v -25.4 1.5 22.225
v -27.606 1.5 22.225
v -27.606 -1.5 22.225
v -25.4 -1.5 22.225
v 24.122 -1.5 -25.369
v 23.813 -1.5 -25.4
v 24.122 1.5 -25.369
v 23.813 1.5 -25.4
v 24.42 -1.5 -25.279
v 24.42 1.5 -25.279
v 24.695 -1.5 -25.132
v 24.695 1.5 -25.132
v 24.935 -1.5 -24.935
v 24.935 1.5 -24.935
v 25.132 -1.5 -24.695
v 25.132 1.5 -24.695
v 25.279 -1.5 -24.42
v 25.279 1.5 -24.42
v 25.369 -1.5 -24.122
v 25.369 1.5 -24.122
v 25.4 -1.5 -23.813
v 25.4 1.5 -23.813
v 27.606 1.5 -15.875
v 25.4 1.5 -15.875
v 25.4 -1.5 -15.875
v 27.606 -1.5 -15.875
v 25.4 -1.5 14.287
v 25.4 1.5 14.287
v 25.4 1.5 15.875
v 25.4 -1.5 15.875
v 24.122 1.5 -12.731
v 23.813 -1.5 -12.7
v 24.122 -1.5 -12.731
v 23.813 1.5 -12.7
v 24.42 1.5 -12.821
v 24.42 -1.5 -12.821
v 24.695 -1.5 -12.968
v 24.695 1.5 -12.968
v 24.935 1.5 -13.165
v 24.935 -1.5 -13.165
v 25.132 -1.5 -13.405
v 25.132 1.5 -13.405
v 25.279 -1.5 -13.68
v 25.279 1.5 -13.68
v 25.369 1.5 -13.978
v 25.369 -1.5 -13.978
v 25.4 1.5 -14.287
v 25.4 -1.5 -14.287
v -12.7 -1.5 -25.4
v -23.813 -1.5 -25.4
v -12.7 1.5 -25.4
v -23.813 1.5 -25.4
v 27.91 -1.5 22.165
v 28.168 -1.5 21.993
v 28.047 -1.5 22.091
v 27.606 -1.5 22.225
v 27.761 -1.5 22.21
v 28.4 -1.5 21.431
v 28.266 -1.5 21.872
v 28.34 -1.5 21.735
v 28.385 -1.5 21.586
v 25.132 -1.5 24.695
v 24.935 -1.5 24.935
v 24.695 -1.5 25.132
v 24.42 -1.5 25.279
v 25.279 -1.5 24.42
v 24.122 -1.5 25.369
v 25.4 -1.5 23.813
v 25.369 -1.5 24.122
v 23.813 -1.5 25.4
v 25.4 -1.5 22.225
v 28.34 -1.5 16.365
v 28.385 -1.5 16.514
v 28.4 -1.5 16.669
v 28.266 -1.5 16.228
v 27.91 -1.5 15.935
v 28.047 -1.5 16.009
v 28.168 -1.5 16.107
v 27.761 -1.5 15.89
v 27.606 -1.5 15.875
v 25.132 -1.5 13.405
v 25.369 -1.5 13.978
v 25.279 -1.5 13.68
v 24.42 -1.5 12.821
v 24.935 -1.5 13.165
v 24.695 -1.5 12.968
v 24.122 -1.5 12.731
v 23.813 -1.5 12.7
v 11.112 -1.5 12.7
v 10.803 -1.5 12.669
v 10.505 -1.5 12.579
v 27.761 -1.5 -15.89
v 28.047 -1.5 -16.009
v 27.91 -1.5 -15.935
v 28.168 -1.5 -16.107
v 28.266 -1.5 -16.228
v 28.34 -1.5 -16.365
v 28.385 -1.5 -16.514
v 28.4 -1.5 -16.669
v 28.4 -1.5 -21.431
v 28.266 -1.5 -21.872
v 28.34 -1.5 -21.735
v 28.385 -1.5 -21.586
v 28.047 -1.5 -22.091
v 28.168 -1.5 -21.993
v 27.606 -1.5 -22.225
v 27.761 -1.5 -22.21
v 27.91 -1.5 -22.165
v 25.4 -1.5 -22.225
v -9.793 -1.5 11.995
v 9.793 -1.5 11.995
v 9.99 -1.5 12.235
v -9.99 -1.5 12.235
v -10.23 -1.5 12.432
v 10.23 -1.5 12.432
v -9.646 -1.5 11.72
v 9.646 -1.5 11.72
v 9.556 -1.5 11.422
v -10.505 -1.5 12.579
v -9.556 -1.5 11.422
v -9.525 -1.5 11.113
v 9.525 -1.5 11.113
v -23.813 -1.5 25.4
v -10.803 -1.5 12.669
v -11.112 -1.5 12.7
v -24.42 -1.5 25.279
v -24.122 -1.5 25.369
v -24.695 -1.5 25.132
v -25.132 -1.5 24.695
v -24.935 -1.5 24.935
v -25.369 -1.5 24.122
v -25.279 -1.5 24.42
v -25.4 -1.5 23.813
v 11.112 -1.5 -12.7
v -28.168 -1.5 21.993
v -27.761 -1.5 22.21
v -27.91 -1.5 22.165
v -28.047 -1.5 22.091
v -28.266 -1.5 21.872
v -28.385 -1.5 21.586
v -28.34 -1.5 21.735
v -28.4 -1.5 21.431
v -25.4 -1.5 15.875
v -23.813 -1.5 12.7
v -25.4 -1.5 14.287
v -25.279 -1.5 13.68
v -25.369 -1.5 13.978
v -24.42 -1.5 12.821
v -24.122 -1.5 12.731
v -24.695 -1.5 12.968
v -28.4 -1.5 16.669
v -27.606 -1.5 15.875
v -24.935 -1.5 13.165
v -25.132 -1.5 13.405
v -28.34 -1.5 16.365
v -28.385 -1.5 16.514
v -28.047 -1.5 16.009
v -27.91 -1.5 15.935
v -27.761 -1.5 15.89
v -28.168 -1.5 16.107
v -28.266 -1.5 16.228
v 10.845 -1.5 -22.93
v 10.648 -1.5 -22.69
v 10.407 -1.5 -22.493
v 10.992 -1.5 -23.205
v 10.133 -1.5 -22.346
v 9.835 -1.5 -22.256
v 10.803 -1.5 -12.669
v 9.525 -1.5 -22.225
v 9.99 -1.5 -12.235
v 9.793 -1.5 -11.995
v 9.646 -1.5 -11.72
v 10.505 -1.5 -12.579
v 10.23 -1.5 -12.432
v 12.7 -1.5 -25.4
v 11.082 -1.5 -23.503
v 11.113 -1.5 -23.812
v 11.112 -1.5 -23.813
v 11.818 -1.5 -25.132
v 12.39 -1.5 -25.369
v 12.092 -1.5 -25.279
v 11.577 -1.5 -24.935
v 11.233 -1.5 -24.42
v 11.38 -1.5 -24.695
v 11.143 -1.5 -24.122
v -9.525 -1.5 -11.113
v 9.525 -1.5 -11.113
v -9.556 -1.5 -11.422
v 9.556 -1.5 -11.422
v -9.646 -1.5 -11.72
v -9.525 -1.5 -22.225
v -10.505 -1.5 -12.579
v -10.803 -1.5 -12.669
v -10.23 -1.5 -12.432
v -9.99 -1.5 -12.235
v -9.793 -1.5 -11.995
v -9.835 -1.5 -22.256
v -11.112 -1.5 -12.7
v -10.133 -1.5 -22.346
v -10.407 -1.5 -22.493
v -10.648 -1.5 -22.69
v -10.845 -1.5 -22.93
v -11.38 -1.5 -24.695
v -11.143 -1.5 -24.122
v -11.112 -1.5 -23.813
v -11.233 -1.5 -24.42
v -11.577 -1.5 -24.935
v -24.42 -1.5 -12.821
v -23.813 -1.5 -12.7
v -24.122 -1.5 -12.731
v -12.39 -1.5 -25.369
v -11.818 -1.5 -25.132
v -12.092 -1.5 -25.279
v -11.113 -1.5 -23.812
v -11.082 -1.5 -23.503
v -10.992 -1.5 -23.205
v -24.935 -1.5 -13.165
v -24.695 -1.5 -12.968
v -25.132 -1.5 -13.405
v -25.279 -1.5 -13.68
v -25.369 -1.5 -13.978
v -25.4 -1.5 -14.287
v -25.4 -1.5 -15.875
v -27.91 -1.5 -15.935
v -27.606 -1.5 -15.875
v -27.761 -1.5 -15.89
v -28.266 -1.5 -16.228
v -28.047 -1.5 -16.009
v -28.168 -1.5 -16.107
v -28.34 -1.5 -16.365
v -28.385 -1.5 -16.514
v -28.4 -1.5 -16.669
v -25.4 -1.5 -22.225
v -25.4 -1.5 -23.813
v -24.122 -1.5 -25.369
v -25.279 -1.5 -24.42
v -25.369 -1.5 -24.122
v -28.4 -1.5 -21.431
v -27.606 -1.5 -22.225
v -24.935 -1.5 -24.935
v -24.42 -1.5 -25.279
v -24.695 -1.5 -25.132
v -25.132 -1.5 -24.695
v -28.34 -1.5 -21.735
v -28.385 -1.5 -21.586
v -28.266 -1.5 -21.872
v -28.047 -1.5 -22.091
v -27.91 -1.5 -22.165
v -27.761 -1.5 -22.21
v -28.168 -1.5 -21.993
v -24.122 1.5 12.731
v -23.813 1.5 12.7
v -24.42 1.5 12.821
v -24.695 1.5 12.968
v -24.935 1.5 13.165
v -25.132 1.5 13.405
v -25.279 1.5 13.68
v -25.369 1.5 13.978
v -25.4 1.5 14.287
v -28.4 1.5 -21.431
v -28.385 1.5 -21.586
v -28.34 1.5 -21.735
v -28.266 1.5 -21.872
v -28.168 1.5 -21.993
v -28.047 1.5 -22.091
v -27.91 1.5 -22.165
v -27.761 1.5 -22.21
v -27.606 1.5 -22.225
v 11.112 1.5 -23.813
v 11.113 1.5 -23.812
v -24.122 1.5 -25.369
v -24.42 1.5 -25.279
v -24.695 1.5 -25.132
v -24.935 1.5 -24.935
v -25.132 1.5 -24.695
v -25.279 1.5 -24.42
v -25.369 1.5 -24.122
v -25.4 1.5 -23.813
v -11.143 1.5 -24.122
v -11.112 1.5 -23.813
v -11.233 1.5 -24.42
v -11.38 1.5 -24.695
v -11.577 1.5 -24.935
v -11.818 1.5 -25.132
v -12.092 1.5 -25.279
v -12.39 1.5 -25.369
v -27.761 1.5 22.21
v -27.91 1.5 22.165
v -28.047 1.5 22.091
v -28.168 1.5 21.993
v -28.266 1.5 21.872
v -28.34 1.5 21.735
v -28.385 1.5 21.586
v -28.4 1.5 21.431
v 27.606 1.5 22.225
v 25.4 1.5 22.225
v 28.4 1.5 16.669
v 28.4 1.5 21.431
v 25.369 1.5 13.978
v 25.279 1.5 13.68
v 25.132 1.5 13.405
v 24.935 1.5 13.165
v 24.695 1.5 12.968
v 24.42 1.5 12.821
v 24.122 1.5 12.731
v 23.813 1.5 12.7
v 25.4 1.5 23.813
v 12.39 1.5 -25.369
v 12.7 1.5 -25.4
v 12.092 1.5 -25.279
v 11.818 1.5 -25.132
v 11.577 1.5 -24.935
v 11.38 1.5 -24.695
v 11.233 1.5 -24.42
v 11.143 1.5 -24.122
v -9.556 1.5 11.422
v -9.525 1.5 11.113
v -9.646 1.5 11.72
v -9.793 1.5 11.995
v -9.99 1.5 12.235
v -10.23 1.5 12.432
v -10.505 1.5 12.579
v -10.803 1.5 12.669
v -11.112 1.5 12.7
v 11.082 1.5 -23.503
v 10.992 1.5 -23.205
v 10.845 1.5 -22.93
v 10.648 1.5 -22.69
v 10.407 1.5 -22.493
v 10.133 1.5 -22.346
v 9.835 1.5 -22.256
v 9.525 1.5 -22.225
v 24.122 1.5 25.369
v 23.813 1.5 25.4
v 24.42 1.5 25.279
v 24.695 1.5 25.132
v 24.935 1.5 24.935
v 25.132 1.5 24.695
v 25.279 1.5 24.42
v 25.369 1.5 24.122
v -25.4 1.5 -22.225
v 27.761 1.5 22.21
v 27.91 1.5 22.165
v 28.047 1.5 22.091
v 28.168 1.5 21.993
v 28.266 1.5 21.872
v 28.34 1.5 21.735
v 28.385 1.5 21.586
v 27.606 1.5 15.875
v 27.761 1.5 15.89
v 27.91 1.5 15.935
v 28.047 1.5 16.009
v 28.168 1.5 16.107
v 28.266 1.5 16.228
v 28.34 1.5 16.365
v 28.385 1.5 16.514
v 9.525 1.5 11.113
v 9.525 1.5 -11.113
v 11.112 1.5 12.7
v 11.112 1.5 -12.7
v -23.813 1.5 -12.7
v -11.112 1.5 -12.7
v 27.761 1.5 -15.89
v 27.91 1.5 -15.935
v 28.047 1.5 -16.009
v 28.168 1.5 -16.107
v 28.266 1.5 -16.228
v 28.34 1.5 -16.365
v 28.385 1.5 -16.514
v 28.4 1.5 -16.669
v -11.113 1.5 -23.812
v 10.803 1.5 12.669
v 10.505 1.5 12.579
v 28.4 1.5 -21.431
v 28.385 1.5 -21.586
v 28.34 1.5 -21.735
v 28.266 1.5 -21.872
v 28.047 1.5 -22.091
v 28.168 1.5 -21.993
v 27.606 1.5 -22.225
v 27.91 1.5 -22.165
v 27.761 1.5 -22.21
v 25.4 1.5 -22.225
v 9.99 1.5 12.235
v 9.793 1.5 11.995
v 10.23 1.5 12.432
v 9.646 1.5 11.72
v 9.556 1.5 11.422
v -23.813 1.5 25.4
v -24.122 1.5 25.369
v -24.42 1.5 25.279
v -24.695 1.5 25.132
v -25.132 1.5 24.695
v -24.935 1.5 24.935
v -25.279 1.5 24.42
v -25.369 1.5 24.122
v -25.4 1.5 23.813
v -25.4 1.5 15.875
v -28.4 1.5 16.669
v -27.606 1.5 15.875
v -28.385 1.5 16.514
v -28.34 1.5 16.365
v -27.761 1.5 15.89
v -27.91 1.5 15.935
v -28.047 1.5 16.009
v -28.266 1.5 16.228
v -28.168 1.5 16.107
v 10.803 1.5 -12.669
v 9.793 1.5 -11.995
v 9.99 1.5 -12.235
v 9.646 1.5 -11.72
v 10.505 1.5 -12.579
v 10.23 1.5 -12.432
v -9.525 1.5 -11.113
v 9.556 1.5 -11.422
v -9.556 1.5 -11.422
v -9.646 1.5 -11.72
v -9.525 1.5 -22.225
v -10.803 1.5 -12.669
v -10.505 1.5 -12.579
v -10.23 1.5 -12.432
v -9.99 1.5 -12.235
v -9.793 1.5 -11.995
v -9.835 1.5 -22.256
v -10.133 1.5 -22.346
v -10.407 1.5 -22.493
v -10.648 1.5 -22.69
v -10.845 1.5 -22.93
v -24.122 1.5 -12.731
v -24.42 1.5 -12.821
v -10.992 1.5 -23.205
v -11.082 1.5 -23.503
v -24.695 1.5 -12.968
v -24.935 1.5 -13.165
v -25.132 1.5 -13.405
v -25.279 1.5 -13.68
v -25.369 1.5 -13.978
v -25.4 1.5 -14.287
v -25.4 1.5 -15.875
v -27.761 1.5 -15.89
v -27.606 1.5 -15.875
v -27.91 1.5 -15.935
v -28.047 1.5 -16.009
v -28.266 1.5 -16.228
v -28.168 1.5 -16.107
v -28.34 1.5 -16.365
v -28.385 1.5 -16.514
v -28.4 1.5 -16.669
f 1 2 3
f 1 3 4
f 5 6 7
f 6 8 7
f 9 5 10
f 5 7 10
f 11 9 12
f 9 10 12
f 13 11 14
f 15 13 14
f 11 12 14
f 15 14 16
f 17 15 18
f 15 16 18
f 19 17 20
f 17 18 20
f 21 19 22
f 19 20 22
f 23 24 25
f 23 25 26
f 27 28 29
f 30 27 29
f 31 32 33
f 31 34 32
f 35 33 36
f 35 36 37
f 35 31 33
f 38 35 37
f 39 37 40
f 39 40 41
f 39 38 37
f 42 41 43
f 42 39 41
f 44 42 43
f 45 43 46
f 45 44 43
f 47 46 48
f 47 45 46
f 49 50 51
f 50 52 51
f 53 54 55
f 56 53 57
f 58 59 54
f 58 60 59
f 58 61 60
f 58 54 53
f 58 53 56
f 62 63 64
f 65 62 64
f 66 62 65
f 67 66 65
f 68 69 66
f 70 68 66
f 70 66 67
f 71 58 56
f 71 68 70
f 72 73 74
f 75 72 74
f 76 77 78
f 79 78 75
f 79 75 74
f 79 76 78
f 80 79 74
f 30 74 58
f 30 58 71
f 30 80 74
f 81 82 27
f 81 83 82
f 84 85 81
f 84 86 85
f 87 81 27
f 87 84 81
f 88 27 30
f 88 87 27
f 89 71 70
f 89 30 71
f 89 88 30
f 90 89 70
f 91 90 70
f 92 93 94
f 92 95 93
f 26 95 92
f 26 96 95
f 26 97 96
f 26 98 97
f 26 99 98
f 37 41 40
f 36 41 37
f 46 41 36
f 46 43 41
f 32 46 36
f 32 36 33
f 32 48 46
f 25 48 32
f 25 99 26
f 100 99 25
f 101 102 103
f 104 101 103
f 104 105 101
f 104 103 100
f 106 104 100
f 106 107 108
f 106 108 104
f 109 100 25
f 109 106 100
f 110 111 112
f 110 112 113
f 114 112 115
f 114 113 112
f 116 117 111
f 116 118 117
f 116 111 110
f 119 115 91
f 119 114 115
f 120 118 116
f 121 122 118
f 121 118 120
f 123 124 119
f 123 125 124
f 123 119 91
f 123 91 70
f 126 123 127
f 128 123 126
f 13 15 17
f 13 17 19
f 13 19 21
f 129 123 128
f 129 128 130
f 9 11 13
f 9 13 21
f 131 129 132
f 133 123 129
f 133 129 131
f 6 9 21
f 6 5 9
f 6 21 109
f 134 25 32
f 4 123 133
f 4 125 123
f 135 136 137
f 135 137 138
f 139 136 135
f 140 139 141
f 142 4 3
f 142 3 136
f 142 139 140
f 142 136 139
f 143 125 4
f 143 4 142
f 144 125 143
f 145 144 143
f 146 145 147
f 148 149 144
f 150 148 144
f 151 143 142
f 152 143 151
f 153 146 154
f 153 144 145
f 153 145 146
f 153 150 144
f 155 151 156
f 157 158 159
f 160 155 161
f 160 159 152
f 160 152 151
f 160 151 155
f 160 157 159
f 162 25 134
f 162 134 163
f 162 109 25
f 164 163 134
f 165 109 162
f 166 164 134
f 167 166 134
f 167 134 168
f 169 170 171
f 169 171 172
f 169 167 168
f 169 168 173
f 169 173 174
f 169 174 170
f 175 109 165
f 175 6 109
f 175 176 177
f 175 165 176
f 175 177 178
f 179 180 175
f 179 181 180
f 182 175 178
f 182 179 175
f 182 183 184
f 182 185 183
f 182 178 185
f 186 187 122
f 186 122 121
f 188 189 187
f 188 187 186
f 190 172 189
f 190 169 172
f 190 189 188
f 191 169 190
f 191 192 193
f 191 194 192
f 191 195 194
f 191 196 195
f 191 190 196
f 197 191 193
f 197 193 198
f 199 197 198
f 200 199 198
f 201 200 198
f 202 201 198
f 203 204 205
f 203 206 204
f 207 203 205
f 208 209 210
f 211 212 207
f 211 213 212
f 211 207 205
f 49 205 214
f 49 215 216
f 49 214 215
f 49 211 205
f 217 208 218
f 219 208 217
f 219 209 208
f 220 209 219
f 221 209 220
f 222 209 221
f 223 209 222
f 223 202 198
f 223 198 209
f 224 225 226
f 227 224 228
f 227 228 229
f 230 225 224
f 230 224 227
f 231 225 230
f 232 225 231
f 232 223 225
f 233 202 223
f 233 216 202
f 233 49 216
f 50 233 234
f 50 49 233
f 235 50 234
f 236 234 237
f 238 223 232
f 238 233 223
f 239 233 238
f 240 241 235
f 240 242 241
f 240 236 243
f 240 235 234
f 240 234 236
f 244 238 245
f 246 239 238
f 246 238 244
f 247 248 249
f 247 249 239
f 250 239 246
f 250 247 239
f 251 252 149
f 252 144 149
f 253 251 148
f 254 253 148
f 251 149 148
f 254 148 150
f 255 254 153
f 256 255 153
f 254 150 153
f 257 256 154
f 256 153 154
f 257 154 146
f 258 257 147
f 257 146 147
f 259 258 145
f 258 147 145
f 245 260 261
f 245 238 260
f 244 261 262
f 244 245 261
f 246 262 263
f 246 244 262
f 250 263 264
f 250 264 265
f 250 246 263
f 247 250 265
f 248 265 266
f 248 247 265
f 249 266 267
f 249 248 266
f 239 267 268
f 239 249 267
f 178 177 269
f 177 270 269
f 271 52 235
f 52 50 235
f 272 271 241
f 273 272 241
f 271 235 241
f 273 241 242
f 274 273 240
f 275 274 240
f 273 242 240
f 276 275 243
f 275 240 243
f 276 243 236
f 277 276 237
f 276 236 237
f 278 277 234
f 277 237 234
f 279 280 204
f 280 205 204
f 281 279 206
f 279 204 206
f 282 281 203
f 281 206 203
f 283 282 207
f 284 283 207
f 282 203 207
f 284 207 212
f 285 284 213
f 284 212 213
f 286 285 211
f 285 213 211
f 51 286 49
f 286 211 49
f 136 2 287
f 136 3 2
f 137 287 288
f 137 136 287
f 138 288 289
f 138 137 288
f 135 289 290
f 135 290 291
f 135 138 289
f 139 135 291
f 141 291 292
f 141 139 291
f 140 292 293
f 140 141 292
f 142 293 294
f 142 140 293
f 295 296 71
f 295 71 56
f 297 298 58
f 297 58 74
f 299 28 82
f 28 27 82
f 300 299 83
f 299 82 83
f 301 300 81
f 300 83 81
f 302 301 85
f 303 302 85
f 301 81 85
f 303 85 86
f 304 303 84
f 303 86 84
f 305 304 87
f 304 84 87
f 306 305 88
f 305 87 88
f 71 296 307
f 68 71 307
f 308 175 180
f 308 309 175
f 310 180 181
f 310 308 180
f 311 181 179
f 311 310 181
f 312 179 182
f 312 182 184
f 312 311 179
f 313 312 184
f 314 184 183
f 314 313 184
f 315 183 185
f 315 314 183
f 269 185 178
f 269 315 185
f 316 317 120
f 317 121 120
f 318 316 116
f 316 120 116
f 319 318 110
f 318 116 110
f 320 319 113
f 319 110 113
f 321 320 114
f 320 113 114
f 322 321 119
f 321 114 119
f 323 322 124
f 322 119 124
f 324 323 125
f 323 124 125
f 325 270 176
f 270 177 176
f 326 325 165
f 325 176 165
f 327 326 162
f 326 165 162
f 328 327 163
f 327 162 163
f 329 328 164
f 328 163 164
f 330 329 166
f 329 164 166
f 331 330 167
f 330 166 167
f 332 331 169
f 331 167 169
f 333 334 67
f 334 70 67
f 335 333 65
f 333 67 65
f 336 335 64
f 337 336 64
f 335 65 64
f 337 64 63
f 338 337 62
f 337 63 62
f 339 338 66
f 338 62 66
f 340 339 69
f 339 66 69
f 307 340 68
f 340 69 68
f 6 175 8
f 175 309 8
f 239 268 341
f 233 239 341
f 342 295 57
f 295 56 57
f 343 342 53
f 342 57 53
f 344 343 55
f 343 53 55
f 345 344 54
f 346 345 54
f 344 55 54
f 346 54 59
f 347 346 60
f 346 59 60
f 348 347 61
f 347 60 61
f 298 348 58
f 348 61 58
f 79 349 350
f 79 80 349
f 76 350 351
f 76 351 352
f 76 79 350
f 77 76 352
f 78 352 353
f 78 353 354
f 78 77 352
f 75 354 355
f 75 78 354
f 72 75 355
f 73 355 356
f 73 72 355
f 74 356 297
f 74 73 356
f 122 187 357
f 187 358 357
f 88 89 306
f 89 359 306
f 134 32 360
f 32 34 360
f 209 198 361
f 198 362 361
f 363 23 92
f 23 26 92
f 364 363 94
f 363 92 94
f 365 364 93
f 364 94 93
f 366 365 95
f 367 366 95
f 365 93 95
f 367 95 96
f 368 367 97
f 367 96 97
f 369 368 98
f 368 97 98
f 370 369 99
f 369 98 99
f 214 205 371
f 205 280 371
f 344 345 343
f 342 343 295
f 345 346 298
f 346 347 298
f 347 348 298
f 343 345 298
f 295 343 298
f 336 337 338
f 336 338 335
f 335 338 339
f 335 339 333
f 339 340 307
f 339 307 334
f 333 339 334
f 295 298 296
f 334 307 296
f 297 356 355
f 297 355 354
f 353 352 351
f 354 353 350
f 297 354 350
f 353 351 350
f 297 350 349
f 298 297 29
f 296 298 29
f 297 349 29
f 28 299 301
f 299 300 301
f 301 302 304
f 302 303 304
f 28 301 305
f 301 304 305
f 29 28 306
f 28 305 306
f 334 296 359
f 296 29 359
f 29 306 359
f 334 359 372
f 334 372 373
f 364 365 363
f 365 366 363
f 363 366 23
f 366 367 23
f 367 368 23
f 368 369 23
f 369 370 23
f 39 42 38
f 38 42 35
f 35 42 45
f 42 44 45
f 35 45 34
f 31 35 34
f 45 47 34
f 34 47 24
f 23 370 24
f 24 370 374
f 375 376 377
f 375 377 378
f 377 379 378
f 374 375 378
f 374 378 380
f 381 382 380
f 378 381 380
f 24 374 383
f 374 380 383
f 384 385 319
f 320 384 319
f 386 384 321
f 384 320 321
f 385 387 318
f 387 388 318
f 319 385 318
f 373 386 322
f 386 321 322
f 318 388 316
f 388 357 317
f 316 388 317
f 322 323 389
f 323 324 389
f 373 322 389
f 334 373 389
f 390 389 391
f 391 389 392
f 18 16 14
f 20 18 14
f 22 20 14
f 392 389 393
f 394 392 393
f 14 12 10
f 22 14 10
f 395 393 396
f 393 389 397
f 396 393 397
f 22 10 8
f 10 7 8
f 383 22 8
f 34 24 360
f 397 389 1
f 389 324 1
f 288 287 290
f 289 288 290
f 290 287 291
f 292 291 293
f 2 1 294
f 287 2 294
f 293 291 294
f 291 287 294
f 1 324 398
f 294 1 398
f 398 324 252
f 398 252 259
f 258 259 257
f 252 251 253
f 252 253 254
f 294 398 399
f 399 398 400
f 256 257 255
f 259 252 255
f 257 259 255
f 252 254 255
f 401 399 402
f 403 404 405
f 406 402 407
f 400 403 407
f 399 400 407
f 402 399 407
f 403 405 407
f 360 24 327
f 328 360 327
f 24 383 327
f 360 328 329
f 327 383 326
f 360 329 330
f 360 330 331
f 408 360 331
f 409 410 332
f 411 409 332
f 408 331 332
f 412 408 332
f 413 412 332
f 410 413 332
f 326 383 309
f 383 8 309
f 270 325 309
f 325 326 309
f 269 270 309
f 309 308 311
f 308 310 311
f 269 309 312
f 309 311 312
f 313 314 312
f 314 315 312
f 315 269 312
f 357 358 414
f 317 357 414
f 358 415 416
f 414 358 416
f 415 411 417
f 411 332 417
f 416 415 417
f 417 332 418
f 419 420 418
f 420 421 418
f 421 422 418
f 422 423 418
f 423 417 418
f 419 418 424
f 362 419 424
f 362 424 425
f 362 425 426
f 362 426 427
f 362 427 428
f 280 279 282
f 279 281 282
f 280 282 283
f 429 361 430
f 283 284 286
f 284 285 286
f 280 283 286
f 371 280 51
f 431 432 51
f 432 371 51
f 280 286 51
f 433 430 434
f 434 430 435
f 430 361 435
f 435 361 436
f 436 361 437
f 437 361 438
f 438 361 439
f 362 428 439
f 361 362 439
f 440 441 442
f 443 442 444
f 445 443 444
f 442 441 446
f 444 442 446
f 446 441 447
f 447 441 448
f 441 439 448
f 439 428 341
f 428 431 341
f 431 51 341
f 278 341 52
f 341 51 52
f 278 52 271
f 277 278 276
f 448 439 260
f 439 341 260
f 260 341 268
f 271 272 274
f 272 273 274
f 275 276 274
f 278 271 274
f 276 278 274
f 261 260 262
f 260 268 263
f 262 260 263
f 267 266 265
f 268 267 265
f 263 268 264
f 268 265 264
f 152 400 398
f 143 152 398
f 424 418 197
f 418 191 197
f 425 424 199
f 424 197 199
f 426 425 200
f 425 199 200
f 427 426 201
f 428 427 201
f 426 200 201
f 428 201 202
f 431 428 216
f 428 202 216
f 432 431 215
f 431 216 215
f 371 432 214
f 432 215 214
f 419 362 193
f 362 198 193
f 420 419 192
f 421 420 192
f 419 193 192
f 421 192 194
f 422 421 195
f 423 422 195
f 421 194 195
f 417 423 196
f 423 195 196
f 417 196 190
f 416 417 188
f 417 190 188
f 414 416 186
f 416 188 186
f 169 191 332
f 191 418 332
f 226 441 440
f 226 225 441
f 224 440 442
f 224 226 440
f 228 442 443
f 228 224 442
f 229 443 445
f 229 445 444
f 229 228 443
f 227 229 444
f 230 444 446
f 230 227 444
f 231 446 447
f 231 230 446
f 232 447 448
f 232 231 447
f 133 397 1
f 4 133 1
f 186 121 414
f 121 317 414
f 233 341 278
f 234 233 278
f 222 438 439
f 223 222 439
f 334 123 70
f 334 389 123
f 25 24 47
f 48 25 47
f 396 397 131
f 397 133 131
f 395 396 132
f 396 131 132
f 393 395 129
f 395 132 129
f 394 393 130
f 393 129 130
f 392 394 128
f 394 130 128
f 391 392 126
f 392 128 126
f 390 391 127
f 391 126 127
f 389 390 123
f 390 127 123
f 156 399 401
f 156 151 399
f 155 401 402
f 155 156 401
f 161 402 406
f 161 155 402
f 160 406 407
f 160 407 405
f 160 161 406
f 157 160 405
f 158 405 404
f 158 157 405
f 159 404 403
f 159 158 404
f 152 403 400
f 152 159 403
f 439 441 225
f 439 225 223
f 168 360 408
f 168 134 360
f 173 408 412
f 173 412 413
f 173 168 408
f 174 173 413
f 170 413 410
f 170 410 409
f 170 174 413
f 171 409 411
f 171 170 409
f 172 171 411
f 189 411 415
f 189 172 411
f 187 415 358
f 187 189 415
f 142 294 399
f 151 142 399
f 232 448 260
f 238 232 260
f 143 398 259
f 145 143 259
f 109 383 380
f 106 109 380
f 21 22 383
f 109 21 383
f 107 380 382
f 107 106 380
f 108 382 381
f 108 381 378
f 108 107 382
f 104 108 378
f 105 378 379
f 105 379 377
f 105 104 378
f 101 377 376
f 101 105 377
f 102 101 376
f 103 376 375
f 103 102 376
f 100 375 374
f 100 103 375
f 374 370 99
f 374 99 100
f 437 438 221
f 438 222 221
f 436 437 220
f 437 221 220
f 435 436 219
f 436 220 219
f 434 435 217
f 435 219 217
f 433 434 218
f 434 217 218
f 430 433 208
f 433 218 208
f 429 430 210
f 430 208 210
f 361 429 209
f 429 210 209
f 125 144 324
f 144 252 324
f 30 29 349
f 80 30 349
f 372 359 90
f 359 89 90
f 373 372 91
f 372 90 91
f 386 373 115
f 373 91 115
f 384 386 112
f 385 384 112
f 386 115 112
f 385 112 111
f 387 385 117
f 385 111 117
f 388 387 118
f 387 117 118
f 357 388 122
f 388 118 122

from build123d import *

# Parameters (mm, degrees)
BOSS_EXTRUDE1_DEPTH = 1.5
FILLET1_R           = 1.5875
SKETCH2_W           = 3
SKETCH2_H           = 6.35
BOSS_EXTRUDE2_DEPTH = 3
FILLET2_R           = 0.79375


with BuildPart() as part:
    # Sketch1 → Boss-Extrude1 (new, symmetric)
    with BuildSketch(Plane(origin=(0, 0, 0), x_dir=(1, 0, 0), z_dir=(0, 1, 0))):
        Polygon((25.4, 12.7), (9.525, 12.7), (9.525, -12.7), (25.4, -12.7), (25.4, -25.4), (9.525, -25.4), (0, -25.4), (-9.525, -25.4), (-25.4, -25.4), (-25.4, -12.7), (-9.525, -12.7), (-9.525, 12.7), (-25.4, 12.7), (-25.4, 25.4), (-11.1125, 25.4), (-11.1125, 22.225), (11.1125, 22.225), (11.1125, 25.4), (25.4, 25.4), align=None)
    extrude(amount=BOSS_EXTRUDE1_DEPTH, both=True)

    # Fillet1
    fillet1_edges = [part.edges().sort_by_distance(p)[0] for p in [
        (25.4, 0, -12.7),
        (9.525, 0, -12.7),
        (9.525, 0, 12.7),
        (25.4, 0, 12.7),
        (25.4, 0, 25.4),
        (-25.4, 0, 12.7),
        (-9.525, 0, 12.7),
        (-9.525, 0, -12.7),
        (-25.4, 0, -12.7),
        (-25.4, 0, -25.4),
        (-25.4, 0, 25.4),
        (25.4, 0, -25.4),
        (-11.1125, 0, -25.4),
        (-11.1125, 0, -22.225),
        (11.1125, 0, -22.225),
        (11.1125, 0, -25.4),
    ]]
    fillet(fillet1_edges, radius=FILLET1_R - 0.0001)  # a hair under: the kernel refuses the full size

    # Sketch2 → Boss-Extrude2 (add)
    with BuildSketch(Plane(origin=(0, 1.5, 0), x_dir=(1, 0, 0), z_dir=(0, 1, 0))):
        with Locations((-26.9, 19.05)):
            Rectangle(SKETCH2_W, SKETCH2_H)
        with Locations((26.9, 19.05)):
            Rectangle(SKETCH2_W, SKETCH2_H)
        with Locations((26.9, -19.05)):
            Rectangle(SKETCH2_W, SKETCH2_H)
        with Locations((-26.9, -19.05)):
            Rectangle(SKETCH2_W, SKETCH2_H)
    extrude(amount=-BOSS_EXTRUDE2_DEPTH)

    # Fillet2
    fillet2_edges = [part.edges().sort_by_distance(p)[0] for p in [
        (-28.4, 0, 22.225),
        (-28.4, 0, 15.875),
        (28.4, 0, 15.875),
        (28.4, 0, 22.225),
        (28.4, 0, -22.225),
        (28.4, 0, -15.875),
        (-28.4, 0, -15.875),
        (-28.4, 0, -22.225),
    ]]
    fillet(fillet2_edges, radius=FILLET2_R)


solid = part.part
